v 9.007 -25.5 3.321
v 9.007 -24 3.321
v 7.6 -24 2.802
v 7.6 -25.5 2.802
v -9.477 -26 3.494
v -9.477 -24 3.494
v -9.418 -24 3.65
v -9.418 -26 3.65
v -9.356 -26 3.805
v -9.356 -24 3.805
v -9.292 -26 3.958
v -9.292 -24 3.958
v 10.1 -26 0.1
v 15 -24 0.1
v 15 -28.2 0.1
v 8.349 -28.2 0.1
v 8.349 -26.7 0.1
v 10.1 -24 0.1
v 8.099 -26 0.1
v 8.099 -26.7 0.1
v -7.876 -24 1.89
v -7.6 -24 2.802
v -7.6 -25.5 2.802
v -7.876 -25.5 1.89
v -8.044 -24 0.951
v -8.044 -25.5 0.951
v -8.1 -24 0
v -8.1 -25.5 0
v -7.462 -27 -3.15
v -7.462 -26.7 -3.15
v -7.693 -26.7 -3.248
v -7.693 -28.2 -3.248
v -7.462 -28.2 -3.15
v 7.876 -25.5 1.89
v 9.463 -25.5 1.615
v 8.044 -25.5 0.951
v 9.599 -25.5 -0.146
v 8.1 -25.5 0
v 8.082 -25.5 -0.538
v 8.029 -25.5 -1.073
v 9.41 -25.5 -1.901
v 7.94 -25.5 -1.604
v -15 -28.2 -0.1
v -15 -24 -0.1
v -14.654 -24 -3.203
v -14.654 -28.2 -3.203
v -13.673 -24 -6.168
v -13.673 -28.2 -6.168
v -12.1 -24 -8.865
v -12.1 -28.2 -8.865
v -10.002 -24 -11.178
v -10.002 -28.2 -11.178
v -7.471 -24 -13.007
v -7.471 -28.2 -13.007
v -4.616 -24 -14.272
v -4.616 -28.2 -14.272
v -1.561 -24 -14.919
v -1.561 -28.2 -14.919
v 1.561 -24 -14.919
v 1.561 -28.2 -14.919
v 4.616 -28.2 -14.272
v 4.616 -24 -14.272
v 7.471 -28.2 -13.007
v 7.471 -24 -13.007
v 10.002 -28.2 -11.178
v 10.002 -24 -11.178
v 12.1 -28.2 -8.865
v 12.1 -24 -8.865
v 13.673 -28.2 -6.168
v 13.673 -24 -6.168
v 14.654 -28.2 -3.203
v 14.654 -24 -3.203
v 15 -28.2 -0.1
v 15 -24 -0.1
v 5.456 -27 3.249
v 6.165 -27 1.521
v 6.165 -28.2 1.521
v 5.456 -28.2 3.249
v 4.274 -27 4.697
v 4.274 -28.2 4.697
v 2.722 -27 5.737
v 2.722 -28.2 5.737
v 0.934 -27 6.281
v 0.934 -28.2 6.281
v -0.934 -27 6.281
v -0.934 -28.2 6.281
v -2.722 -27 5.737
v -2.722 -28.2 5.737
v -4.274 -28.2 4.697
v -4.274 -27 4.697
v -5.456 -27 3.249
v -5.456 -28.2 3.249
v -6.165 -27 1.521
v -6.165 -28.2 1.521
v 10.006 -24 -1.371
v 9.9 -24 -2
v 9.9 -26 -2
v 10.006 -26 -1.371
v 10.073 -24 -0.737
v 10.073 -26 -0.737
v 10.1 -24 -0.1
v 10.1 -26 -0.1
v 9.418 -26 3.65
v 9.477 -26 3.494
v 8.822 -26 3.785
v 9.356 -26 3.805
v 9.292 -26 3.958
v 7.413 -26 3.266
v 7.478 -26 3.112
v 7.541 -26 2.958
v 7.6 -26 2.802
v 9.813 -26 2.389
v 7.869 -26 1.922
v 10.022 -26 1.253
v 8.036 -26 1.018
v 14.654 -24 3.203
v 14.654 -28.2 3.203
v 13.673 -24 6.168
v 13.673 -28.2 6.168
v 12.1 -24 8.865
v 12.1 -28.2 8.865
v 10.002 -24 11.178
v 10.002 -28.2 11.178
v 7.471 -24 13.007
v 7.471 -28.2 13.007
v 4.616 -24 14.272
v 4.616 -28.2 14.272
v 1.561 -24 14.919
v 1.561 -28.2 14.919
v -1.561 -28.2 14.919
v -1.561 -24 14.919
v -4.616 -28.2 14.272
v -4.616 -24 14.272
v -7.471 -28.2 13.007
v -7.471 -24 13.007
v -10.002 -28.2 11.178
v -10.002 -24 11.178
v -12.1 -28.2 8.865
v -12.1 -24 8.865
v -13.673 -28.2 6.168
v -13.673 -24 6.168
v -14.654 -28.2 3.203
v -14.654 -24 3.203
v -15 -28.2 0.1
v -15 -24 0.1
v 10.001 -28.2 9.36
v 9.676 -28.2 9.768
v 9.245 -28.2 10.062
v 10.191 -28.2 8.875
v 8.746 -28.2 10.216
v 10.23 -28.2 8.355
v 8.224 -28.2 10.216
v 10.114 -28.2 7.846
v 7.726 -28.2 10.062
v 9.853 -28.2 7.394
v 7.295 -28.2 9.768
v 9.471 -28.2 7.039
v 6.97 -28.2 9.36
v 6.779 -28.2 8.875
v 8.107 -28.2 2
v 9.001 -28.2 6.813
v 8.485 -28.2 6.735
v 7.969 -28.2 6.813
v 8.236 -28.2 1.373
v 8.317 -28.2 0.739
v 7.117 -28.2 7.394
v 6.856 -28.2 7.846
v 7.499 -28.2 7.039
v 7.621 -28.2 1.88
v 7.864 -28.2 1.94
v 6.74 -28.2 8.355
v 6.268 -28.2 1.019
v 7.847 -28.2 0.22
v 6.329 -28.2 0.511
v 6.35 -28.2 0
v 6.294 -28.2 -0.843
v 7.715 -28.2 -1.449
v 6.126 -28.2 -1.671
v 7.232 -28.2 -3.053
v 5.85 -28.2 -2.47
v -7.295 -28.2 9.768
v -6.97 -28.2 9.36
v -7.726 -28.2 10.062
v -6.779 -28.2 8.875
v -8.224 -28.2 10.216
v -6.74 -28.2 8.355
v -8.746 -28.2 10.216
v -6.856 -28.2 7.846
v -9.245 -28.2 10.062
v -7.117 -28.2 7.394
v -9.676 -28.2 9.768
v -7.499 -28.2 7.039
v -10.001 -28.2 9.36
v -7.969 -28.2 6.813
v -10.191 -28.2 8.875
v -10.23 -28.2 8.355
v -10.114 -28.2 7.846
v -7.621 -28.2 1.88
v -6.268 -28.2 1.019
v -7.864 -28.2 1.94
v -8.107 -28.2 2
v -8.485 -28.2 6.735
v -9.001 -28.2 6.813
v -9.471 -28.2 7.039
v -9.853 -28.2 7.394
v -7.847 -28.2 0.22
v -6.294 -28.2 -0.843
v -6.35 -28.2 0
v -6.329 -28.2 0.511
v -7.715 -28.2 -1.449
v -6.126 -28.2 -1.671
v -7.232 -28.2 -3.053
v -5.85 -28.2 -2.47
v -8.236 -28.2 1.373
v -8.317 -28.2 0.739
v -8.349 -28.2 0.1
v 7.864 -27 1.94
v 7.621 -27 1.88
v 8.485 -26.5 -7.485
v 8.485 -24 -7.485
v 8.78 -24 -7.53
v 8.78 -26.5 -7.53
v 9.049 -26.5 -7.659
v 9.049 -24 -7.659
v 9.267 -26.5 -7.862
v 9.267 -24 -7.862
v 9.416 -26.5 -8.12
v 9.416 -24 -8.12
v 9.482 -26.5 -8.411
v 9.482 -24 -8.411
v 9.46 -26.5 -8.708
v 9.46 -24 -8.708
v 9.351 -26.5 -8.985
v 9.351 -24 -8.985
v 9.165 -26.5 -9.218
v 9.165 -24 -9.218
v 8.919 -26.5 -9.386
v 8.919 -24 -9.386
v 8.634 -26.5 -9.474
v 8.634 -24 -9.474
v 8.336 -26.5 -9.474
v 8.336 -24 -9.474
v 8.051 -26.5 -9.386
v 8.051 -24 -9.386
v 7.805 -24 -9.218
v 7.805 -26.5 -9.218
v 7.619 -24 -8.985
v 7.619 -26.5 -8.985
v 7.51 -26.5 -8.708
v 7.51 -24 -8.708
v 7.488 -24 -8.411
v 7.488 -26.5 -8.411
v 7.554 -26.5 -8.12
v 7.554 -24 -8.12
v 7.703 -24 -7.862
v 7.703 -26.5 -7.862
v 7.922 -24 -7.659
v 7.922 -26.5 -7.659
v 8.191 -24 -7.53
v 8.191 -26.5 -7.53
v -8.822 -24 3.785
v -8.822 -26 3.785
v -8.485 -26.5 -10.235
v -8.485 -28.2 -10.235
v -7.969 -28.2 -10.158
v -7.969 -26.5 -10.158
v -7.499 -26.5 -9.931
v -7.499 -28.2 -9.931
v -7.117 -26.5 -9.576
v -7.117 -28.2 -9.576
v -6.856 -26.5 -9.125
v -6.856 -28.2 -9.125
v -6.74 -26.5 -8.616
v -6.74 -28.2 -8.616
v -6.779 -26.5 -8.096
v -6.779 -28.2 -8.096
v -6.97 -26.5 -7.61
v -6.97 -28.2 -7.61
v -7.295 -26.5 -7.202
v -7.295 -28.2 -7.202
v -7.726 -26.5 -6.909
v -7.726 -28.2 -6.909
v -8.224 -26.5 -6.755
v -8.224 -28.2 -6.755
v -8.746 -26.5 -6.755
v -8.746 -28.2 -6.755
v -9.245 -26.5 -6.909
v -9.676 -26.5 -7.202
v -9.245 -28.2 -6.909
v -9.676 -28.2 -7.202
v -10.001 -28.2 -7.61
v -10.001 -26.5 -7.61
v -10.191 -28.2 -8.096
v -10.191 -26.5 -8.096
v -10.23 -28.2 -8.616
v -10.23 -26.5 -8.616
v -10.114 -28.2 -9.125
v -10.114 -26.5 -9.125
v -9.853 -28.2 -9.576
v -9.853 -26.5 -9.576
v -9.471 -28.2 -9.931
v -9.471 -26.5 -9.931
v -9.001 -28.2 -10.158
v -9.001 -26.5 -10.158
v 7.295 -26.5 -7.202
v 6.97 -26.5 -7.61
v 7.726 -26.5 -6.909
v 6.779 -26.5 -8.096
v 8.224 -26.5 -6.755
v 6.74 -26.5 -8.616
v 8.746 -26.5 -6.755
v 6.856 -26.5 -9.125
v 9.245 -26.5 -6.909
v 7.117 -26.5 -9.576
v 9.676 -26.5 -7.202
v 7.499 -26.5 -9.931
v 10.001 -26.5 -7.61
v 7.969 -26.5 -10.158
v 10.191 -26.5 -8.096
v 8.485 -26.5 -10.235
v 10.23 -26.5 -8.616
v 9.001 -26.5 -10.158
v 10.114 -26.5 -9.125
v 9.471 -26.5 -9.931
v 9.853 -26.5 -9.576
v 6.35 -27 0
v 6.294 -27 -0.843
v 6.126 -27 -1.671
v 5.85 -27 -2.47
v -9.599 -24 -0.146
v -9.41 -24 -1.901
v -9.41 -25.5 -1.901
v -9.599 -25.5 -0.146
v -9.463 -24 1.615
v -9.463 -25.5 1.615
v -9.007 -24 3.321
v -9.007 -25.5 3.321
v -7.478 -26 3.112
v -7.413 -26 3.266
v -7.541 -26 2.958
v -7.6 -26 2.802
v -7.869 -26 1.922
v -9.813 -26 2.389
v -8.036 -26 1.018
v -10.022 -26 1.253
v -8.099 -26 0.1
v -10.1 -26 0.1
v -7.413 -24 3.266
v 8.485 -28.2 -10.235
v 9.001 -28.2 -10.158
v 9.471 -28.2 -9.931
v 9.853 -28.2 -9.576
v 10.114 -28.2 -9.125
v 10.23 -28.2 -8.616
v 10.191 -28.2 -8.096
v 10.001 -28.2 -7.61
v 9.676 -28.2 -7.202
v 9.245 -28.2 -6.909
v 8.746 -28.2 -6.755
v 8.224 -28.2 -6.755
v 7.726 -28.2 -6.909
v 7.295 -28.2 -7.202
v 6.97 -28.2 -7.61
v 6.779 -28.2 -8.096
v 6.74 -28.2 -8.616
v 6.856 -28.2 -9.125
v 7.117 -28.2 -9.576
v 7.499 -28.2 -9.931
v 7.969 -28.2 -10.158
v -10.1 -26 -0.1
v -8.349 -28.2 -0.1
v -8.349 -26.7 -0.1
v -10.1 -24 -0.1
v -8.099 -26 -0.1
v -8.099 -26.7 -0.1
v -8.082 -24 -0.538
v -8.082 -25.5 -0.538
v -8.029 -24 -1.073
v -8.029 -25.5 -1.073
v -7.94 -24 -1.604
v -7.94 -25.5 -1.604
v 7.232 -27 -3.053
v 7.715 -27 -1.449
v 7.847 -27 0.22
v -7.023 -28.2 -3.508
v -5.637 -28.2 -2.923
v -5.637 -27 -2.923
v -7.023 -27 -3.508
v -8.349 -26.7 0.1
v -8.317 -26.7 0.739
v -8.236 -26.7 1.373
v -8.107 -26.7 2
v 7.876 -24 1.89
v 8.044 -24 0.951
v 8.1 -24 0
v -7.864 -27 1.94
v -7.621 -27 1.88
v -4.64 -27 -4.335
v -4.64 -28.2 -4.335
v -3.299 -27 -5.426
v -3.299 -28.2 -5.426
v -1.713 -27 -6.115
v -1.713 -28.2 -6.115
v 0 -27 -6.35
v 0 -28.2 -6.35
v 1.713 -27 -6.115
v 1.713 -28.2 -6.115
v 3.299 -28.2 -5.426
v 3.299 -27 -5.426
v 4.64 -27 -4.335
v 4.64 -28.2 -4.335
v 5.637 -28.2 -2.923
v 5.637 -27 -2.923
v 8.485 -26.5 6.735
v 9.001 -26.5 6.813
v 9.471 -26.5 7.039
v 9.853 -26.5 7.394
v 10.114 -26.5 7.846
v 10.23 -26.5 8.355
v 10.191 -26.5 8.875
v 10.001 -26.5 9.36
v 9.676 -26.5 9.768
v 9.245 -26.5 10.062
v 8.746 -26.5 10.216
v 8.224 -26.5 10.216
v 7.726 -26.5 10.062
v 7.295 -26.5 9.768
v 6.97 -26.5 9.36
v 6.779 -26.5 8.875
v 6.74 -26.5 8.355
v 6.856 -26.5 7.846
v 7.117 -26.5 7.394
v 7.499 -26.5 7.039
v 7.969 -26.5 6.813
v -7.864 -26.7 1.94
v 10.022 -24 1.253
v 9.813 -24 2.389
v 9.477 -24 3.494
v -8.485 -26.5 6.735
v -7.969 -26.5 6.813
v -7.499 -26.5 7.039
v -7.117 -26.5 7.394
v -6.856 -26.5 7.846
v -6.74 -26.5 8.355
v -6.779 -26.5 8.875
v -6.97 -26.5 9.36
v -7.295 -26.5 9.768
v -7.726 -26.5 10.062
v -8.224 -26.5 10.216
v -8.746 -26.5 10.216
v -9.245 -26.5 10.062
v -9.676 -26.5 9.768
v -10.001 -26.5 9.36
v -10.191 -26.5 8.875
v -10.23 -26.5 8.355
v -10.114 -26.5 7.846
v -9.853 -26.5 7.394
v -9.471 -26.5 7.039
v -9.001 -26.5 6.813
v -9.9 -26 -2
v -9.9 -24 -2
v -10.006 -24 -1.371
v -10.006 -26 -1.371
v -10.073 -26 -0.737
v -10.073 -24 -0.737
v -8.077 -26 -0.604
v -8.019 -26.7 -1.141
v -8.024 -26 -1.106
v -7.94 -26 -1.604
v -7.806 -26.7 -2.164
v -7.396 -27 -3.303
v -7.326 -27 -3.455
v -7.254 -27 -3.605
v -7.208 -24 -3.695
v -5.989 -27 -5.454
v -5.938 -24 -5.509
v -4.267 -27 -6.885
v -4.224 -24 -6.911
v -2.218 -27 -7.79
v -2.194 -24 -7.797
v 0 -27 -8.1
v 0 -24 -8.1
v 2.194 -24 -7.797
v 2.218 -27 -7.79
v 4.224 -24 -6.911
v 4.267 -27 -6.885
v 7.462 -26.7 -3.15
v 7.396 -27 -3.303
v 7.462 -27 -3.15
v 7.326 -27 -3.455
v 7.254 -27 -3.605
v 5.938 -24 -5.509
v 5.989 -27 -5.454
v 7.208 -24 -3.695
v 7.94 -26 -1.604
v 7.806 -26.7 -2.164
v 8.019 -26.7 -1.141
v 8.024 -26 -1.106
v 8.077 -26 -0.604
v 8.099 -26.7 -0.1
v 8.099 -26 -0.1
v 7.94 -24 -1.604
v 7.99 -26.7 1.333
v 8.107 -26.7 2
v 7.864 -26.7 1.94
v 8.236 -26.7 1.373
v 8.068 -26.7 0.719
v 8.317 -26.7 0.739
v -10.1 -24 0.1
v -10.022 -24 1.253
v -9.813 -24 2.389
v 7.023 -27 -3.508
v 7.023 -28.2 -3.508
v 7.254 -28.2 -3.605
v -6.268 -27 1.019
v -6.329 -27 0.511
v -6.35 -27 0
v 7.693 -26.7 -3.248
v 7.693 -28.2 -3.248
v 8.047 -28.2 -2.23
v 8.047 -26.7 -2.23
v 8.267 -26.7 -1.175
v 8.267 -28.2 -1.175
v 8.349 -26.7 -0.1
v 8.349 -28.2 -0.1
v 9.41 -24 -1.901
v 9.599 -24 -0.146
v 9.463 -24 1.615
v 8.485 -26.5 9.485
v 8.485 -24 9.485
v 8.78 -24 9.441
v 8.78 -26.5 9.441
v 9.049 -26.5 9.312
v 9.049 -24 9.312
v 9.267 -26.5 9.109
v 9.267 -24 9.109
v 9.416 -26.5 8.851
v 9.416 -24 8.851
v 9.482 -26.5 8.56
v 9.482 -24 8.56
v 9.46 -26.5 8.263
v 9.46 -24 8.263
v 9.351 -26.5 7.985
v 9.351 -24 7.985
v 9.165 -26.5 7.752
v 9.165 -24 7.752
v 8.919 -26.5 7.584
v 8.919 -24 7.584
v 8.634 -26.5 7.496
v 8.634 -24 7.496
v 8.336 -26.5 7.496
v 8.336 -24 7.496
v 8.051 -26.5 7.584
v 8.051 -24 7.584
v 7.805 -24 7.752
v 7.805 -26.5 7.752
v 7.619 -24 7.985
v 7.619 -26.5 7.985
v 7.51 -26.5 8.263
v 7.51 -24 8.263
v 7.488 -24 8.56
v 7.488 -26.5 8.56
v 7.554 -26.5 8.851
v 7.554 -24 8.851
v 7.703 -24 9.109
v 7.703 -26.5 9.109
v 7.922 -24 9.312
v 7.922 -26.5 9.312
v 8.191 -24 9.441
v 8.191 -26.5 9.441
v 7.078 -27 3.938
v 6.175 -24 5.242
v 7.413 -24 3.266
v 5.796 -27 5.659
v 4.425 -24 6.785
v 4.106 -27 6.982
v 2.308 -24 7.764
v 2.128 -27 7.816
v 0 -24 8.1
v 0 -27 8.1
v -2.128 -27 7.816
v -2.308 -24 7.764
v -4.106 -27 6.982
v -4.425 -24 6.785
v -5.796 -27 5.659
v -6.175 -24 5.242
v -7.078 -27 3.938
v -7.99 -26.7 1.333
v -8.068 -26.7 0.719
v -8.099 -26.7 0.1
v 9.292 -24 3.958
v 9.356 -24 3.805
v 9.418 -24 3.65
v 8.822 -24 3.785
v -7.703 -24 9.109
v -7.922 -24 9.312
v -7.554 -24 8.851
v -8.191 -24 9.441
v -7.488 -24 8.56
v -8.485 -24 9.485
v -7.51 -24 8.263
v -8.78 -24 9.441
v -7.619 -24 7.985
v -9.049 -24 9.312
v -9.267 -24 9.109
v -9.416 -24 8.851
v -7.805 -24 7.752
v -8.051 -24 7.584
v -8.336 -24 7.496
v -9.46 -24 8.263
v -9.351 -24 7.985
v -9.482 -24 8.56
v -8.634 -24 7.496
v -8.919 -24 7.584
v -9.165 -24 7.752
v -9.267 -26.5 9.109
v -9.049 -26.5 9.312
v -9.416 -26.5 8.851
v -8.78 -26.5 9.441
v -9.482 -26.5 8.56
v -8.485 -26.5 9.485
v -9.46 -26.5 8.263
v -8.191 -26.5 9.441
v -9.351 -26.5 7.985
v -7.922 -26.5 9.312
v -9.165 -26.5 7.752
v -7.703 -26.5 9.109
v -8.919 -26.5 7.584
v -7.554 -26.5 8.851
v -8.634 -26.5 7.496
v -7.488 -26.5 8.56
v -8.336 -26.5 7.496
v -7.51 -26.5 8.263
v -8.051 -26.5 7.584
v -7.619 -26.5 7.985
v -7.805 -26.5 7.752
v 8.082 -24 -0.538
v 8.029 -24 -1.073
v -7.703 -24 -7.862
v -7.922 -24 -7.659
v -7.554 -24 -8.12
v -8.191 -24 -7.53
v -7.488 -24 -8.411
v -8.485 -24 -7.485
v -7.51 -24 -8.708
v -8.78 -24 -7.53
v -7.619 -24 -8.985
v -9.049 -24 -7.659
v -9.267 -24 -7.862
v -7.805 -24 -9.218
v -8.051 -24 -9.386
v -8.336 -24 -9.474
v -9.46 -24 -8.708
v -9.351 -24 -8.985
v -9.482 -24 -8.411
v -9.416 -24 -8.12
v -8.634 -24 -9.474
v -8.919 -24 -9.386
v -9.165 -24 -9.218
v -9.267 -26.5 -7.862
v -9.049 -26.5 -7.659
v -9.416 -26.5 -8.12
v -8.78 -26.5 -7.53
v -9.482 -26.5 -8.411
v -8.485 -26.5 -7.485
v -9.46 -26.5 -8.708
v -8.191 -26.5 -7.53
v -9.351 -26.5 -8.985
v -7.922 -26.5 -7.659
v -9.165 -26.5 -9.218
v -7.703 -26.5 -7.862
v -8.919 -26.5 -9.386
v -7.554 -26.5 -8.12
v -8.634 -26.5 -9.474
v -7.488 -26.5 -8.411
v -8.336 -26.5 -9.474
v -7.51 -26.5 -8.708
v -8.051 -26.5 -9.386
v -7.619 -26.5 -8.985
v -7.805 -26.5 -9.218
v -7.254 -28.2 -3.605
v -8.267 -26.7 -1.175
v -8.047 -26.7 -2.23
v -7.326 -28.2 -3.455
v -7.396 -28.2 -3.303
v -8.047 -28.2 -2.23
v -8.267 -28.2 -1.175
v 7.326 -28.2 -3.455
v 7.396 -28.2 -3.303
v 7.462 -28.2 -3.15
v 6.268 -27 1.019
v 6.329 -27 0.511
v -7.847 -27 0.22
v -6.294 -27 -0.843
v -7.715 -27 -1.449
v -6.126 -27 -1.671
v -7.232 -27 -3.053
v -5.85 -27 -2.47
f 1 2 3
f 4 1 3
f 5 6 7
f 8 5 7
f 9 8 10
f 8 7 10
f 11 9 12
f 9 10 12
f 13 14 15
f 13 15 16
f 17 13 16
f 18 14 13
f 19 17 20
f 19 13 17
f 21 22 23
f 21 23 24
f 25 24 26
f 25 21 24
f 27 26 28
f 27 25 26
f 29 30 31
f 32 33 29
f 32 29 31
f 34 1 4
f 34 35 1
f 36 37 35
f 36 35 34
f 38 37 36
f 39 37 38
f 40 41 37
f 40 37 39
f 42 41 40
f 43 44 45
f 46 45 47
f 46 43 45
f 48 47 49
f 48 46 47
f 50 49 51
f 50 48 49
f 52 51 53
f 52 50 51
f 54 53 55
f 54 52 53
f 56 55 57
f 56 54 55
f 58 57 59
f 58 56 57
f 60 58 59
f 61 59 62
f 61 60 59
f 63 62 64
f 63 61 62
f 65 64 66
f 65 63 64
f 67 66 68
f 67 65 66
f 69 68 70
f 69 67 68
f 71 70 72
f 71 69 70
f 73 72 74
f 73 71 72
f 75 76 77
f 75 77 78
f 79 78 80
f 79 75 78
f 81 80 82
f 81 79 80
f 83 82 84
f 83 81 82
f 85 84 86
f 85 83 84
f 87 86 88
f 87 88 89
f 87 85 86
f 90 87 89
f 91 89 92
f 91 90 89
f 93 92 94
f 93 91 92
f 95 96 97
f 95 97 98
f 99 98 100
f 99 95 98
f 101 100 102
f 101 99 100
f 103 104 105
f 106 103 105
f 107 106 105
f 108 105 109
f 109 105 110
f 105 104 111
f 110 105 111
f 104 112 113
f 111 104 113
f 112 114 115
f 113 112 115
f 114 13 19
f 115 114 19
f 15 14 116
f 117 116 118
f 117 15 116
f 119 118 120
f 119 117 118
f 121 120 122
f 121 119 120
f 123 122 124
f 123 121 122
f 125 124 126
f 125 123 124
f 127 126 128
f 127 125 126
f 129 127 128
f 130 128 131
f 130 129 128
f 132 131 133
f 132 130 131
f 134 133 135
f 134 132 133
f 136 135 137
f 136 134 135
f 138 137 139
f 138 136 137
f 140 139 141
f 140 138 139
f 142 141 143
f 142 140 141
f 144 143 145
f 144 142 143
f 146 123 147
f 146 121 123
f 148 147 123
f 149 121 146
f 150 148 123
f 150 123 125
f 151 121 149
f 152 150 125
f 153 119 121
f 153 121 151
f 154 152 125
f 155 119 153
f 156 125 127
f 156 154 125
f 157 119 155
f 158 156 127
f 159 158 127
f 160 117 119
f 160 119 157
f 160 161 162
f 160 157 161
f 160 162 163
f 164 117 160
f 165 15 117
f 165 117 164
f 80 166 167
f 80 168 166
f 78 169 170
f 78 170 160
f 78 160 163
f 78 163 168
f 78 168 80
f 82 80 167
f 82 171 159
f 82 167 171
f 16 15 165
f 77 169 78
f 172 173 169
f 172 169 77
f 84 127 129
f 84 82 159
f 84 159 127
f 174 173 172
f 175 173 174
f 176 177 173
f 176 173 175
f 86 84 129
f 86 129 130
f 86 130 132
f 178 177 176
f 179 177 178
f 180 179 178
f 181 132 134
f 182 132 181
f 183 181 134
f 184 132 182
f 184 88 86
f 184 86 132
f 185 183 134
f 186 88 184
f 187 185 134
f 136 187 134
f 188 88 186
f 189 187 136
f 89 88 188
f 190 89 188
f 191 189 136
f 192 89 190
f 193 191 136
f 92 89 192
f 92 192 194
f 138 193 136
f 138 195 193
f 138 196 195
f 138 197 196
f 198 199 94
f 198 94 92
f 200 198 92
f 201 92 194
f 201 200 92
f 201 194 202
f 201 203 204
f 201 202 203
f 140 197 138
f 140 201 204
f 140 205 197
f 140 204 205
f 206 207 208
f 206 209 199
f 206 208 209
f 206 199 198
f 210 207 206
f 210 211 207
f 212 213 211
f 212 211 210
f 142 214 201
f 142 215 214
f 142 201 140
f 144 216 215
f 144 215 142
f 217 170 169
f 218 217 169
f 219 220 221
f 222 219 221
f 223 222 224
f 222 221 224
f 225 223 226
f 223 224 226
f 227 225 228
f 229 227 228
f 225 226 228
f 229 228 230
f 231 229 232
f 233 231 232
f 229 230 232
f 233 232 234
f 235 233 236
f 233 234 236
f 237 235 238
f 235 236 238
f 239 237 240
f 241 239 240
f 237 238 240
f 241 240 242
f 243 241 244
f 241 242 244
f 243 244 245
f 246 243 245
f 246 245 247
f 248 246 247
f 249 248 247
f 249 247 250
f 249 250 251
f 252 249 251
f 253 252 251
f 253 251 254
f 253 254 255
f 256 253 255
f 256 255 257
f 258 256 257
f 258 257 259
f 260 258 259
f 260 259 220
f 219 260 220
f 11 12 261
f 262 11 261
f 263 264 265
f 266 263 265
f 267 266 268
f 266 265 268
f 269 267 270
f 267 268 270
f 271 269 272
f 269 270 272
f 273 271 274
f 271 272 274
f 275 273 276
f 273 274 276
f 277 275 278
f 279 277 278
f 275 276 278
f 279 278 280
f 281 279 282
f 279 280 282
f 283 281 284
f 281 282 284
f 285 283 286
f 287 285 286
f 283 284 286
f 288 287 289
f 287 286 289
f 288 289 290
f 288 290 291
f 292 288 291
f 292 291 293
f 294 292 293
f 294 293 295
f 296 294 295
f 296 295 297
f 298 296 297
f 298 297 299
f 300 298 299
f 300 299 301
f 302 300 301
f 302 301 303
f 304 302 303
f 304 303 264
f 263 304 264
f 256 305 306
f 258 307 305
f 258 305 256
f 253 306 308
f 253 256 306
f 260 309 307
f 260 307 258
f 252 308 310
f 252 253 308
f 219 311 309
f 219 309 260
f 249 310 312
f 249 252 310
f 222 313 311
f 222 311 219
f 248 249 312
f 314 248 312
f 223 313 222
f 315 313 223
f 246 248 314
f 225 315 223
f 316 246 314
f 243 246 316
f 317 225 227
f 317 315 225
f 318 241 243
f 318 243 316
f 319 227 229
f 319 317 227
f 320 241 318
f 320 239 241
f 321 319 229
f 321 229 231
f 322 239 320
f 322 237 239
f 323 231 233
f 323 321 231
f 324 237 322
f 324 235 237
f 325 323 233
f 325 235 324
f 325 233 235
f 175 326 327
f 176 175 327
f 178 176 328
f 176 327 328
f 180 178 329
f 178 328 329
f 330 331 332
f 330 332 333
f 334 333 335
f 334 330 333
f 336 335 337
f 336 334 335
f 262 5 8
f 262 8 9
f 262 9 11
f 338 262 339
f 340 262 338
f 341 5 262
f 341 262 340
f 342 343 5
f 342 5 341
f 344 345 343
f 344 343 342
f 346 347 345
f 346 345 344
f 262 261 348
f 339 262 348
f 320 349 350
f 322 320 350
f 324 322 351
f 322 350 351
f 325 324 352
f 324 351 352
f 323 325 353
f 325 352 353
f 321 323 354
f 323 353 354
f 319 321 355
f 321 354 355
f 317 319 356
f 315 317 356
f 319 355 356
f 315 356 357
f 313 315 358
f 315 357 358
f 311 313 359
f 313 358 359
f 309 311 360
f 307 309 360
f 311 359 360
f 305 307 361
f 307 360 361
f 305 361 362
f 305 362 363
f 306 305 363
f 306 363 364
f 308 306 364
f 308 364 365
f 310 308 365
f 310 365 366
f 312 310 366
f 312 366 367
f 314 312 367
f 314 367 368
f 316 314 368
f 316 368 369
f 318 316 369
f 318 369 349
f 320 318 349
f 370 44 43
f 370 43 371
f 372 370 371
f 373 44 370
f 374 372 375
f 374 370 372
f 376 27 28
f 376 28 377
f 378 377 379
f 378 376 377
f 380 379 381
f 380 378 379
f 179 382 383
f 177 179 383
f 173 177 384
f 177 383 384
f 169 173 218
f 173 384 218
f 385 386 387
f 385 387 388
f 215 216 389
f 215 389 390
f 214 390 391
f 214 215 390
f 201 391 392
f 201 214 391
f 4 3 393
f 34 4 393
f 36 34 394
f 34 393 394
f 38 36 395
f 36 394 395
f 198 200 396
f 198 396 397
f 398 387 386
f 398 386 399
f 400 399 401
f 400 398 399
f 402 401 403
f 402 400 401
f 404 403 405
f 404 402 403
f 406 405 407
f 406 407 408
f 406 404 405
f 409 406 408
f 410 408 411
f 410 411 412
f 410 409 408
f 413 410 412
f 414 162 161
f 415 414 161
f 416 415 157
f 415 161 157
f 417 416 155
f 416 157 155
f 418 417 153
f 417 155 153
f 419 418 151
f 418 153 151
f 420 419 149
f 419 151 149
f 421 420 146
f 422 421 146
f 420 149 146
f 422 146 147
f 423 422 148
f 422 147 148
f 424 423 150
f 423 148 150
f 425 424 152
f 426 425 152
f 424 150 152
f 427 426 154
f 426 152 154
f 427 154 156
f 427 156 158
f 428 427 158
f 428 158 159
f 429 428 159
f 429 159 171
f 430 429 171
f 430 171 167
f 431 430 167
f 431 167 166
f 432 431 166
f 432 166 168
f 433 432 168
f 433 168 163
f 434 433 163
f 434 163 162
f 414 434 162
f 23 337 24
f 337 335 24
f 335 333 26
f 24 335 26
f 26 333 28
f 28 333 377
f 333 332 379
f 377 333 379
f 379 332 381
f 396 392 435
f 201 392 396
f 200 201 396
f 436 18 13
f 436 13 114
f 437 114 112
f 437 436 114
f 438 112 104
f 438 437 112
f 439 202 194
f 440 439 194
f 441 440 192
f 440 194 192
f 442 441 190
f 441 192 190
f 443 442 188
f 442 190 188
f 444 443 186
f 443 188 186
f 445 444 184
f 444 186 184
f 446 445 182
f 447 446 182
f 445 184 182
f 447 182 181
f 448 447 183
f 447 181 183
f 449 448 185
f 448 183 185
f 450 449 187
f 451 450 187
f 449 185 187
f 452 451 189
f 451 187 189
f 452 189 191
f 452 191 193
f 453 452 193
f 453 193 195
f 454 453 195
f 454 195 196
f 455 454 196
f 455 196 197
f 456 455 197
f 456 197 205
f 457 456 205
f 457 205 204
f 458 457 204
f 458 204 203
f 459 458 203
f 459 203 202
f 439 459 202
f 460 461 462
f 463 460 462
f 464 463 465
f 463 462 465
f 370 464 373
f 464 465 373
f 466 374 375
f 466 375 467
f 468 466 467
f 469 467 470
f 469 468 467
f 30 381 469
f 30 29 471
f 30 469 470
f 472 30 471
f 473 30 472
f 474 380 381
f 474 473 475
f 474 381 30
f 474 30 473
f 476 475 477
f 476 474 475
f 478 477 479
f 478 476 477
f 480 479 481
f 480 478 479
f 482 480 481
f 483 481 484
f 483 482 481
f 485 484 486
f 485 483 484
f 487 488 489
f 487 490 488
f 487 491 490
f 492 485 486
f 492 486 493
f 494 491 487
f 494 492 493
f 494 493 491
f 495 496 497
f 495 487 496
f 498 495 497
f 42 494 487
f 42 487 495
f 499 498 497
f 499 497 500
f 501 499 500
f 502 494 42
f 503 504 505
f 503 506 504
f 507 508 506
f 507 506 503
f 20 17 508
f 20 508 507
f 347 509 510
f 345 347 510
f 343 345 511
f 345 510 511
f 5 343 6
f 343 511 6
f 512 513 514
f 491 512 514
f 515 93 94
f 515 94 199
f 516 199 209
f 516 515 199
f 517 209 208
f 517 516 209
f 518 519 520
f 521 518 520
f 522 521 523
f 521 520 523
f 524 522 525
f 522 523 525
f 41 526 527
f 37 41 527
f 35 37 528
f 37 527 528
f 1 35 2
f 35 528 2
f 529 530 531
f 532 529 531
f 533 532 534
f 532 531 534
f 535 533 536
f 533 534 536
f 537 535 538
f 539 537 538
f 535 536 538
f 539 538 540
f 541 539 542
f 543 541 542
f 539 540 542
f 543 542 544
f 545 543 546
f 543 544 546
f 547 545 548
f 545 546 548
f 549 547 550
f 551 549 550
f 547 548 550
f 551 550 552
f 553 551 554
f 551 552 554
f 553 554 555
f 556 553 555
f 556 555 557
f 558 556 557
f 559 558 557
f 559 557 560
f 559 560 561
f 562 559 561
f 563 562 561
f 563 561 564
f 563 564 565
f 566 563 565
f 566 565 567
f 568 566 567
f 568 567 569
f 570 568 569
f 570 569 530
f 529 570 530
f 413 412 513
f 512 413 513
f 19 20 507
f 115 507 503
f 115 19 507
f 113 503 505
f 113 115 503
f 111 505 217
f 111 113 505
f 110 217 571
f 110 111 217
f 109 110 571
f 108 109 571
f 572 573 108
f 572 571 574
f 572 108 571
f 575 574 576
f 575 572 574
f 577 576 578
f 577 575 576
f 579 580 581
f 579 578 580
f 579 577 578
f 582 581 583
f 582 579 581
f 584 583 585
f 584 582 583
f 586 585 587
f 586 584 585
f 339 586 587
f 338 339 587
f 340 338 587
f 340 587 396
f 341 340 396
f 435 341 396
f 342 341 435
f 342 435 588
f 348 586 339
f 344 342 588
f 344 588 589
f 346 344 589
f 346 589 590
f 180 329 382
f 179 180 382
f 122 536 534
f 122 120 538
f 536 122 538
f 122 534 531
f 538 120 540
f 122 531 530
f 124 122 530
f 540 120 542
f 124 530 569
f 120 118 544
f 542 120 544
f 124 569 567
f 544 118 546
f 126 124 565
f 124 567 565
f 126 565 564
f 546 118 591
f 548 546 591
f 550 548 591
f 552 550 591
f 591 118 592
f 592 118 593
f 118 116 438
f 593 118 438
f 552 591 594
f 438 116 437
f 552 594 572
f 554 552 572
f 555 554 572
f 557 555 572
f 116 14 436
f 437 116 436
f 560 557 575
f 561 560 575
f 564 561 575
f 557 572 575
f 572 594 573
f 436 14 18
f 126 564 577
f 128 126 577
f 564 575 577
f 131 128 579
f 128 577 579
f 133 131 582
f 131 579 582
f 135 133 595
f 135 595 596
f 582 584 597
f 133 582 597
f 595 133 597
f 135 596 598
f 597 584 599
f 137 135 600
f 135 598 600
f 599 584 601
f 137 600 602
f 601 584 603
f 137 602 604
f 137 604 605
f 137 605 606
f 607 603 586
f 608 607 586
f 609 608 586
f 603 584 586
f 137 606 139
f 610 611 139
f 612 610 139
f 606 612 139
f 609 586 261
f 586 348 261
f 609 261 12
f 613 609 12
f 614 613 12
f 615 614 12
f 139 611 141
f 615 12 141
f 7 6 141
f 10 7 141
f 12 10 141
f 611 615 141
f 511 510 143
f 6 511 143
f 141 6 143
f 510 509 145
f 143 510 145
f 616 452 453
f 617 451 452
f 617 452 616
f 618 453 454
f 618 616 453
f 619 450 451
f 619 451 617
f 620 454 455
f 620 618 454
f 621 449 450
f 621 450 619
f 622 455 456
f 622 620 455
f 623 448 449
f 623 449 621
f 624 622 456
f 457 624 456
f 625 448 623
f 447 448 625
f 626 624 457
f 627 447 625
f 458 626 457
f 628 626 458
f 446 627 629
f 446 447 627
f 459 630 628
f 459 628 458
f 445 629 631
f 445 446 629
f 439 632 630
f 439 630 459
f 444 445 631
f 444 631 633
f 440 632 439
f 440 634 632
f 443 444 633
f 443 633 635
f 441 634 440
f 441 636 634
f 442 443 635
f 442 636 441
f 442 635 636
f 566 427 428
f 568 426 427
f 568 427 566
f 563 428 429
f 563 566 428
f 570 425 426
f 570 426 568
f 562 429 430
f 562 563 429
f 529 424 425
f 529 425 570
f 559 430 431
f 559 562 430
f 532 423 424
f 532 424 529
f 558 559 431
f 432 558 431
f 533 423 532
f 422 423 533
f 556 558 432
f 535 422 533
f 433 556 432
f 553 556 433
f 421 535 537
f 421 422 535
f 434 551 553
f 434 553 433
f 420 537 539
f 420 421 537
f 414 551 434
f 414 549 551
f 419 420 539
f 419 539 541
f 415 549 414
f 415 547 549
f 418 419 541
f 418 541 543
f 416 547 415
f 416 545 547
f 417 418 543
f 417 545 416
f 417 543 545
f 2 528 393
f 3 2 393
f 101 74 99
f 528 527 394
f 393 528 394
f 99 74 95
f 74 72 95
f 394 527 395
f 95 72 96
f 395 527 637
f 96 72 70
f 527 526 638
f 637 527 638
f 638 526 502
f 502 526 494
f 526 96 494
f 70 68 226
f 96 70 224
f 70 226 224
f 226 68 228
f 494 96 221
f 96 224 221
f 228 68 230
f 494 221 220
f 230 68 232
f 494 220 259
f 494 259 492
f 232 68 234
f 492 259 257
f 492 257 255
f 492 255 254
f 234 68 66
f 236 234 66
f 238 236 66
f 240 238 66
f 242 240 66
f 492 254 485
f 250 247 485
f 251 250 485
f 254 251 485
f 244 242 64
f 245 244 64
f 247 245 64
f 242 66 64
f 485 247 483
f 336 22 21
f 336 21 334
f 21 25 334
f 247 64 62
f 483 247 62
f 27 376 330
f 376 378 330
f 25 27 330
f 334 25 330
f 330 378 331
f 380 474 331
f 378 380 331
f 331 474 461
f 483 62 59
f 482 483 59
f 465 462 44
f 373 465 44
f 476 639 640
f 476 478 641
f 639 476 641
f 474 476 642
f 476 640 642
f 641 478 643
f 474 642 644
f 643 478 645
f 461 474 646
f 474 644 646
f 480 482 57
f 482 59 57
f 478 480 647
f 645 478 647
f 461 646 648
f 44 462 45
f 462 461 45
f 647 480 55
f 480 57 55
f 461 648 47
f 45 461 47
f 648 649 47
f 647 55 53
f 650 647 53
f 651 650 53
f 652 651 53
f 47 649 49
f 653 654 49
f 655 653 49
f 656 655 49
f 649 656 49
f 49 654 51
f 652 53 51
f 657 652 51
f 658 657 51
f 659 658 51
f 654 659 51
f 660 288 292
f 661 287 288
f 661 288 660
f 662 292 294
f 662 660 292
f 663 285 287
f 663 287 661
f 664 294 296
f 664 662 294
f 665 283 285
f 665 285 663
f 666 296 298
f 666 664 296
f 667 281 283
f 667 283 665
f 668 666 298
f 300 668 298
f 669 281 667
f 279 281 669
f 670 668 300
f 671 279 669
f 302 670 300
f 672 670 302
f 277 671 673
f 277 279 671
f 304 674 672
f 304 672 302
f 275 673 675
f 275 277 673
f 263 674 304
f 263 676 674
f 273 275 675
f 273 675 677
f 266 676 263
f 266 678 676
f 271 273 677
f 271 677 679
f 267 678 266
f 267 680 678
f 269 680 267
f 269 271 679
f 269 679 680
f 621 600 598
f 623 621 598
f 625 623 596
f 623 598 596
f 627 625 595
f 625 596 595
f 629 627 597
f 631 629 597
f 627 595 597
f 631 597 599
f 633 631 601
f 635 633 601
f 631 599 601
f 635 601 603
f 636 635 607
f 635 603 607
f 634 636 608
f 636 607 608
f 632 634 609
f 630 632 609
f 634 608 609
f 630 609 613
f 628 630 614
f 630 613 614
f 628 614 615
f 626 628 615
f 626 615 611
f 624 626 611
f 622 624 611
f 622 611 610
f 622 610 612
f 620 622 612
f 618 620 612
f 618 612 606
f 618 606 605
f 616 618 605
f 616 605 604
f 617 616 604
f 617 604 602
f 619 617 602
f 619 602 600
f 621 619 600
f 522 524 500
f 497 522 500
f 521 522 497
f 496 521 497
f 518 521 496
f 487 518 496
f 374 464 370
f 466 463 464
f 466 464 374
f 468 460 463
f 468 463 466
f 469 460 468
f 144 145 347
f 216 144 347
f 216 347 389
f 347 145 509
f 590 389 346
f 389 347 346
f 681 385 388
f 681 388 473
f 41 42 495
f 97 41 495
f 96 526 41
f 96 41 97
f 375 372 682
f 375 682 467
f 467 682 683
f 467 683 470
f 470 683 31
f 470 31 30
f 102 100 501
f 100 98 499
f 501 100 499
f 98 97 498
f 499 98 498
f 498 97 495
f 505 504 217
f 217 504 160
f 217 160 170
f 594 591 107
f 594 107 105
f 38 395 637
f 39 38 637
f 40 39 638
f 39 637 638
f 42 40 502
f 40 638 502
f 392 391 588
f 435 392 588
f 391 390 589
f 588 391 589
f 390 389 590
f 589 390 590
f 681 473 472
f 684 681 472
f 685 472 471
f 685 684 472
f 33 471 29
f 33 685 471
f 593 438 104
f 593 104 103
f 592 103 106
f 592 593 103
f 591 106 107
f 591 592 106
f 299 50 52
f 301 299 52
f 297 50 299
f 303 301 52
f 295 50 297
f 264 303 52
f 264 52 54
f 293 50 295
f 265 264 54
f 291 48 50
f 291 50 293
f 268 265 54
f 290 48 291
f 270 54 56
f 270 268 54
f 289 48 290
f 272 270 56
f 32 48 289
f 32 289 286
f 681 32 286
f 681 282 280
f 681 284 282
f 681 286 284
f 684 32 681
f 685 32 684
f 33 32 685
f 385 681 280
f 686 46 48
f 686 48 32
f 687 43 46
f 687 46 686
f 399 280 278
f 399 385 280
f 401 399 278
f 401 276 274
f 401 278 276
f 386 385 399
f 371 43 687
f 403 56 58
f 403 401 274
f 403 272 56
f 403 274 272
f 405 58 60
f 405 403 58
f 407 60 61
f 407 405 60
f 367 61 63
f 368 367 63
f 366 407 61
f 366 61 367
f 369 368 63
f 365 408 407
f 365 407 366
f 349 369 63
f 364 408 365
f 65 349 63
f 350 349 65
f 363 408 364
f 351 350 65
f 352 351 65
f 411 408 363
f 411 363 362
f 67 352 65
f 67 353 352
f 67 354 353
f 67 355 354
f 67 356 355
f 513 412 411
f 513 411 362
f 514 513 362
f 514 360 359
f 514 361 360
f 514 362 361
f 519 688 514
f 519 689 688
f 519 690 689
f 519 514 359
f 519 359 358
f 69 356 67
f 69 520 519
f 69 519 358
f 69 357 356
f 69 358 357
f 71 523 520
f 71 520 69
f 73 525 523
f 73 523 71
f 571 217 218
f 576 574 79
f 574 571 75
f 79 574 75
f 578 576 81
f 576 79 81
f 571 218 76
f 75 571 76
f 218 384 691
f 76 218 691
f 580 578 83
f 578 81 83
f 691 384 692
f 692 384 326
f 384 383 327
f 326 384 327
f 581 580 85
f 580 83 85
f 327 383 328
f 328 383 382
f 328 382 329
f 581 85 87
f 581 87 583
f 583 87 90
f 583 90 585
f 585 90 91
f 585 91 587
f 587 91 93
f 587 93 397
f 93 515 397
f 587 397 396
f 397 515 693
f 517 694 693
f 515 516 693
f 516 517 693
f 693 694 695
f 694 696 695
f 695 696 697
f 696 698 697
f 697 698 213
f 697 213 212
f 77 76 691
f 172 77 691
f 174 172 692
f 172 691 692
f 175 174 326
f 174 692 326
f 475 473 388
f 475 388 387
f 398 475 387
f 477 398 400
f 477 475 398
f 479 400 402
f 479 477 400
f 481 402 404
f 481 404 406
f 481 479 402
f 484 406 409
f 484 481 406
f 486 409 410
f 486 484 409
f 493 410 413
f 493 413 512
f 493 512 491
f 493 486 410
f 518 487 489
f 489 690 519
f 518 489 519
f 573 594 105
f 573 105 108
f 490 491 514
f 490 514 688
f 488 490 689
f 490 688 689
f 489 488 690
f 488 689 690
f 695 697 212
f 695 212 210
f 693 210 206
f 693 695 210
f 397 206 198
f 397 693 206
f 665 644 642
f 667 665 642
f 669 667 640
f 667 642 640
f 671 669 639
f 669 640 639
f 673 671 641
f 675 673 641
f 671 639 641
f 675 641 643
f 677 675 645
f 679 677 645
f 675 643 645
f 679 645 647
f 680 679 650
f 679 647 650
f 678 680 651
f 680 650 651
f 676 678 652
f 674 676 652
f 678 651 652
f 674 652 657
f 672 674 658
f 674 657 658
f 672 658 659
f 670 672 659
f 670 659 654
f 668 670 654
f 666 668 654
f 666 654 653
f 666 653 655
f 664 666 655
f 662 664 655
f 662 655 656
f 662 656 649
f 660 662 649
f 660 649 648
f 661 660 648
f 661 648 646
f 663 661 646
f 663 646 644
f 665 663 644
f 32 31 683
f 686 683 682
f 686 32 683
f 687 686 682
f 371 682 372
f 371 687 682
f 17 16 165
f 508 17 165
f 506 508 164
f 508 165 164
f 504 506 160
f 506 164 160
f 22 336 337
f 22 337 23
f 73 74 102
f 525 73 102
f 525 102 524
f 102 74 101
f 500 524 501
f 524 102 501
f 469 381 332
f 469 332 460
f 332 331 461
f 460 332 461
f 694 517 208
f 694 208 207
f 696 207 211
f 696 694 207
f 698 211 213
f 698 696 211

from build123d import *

# Parameters (mm, degrees)
SKETCH4_R           = 1
CUT_EXTRUDE2_DEPTH  = 25.879710609
SKETCH4_3_R         = 1.75
SKETCH4_3_R_2       = 1
CUT_EXTRUDE3_DEPTH  = 9.4
CHAMFER1_SIZE       = 1
SKETCH2_W           = 41.708786628
SKETCH2_H           = 54.576605706
CUT_EXTRUDE1_DEPTH  = 0.05
SKETCH1_5_W         = 6.9
SKETCH1_5_H         = 3
SKETCH1_5_H_2       = 1.2
SKETCH4_4_R         = 1
CUT_EXTRUDE4_DEPTH  = 27.813429471
SKETCH5_R           = 1.75
CUT_EXTRUDE5_DEPTH  = 2.9
CUT_EXTRUDE8_DEPTH  = 2
BOSS_EXTRUDE1_DEPTH = 1.5
CUT_EXTRUDE9_START  = -1.5
CUT_EXTRUDE9_DEPTH  = 1.8
BOSS_EXTRUDE2_DEPTH = 1.2
SKETCH10_W          = 7.7
SKETCH10_H          = 10
SKETCH10_W_2        = 1.8
SKETCH10_H_2        = 3.6
CUT_EXTRUDE10_DEPTH = 0.1
CUT_EXTRUDE11_DEPTH = 1.2


with BuildPart() as part:
    # Sketch1 → Revolve1 (revolve)
    with BuildSketch(Plane.XY, mode=Mode.PRIVATE) as revolve1_sk:
        Polygon((-3, 0), (-8, 0), (-8, -3.7), (-6, -3.7), (-6, -9.7), (-8, -9.7), (-8, -13), (-15, -13), (-15, -23.9), (-6.1, -23.9), (-6.1, -21), (-8.1, -21), (-8.1, -14.3), (-3, -14.3), align=None)
    revolve(revolve1_sk.sketch.rotate(Axis((0, 21.737527327, 0), (0, -1, 0)), 270), axis=Axis((0, 21.737527327, 0), (0, -1, 0)))

    # Sketch4 → Cut-Extrude2 (cut, through all)
    with BuildSketch(Plane(origin=(0, -13, 0), x_dir=(1, 0, 0), z_dir=(0, 1, 0))):
        with Locations(Location((-8.485281374, 8.485281374, 0), (0, 0, 270))):
            Circle(SKETCH4_R)
        with Locations(Location((8.485281374, 8.485281374, 0), (0, 0, 270))):
            Circle(SKETCH4_R)
        with Locations(Location((8.485281374, -8.485281374, 0), (0, 0, 270))):
            Circle(SKETCH4_R)
        with Locations(Location((-8.485281374, -8.485281374, 0), (0, 0, 270))):
            Circle(SKETCH4_R)
    extrude(amount=-CUT_EXTRUDE2_DEPTH, mode=Mode.SUBTRACT)

    # Sketch4<3> → Cut-Extrude3 (cut)
    # profile 1 of 5: a face of its own
    with BuildSketch(Plane(origin=(0, -13, 0), x_dir=(1, 0, 0), z_dir=(0, 1, 0))):
        with Locations(Location((8.485281374, 8.485281374, 0), (0, 0, 270))):
            Circle(SKETCH4_3_R)
        with Locations(Location((8.485281374, 8.485281374, 0), (0, 0, 270))):
            Circle(SKETCH4_3_R_2, mode=Mode.SUBTRACT)
    # profile 2 of 5: a face of its own
    with BuildSketch(Plane(origin=(0, -13, 0), x_dir=(1, 0, 0), z_dir=(0, 1, 0))):
        with Locations(Location((8.485281374, -8.485281374, 0), (0, 0, 270))):
            Circle(SKETCH4_3_R)
        with Locations(Location((8.485281374, -8.485281374, 0), (0, 0, 270))):
            Circle(SKETCH4_3_R_2, mode=Mode.SUBTRACT)
    # profile 3 of 5: a face of its own
    with BuildSketch(Plane(origin=(0, -13, 0), x_dir=(1, 0, 0), z_dir=(0, 1, 0))):
        with Locations(Location((-8.485281374, -8.485281374, 0), (0, 0, 270))):
            Circle(SKETCH4_3_R)
        with Locations(Location((-8.485281374, -8.485281374, 0), (0, 0, 270))):
            Circle(SKETCH4_3_R_2, mode=Mode.SUBTRACT)
    # profile 4 of 5: a face of its own
    with BuildSketch(Plane(origin=(0, -13, 0), x_dir=(1, 0, 0), z_dir=(0, 1, 0))):
        with Locations(Location((-8.485281374, 8.485281374, 0), (0, 0, 270))):
            Circle(SKETCH4_3_R_2)
    # profile 5 of 5: a face of its own
    with BuildSketch(Plane(origin=(0, -13, 0), x_dir=(1, 0, 0), z_dir=(0, 1, 0))):
        with Locations(Location((-8.485281374, 8.485281374, 0), (0, 0, 270))):
            Circle(SKETCH4_3_R)
    extrude(amount=-CUT_EXTRUDE3_DEPTH, mode=Mode.SUBTRACT)

    # Chamfer1
    chamfer1_edges = [part.edges().sort_by_distance(p)[0] for p in [
        (0, 0, -3),
    ]]
    chamfer(chamfer1_edges, length=CHAMFER1_SIZE)

    # Sketch2 → Cut-Extrude1 (cut, symmetric)
    with BuildSketch(Plane.XY):
        Rectangle(SKETCH2_W, SKETCH2_H)
    extrude(amount=CUT_EXTRUDE1_DEPTH, both=True, mode=Mode.SUBTRACT)


with BuildPart() as cut_extrude1_piece_1:
    # of the separate pieces the step leaves, piece 1, a body of its own (cut_extrude1_pieces)
    add(part.part.solids().sort_by_distance((-2.999583304, -1, 0.05))[0])


with BuildPart() as cut_extrude1_piece_2:
    # of the separate pieces the step leaves, piece 2, a body of its own (cut_extrude1_pieces)
    add(part.part.solids().sort_by_distance((-2.999583304, -1, -0.05))[0])


with BuildPart() as body_3:
    # Sketch1<5> → Revolve2 (revolve)
    with BuildSketch(Plane.XY, mode=Mode.PRIVATE) as revolve2_sk:
        with Locations((-11.55, -25.5)):
            Rectangle(SKETCH1_5_W, SKETCH1_5_H)
        Polygon((-6.35, -27), (-8.1, -27), (-15, -27), (-15, -28.2), (-8.1, -28.2), (-6.35, -28.2), align=None)
        with Locations((-11.55, -28.8)):
            Rectangle(SKETCH1_5_W, SKETCH1_5_H_2)
    revolve(revolve2_sk.sketch.rotate(Axis((0, 21.737527327, 0), (0, -1, 0)), 270), axis=Axis((0, 21.737527327, 0), (0, -1, 0)))

    # Sketch4<4> → Cut-Extrude4 (cut, through all)
    with BuildSketch(Plane(origin=(0, -13, 0), x_dir=(1, 0, 0), z_dir=(0, 1, 0))):
        with Locations(Location((8.485281374, 8.485281374, 0), (0, 0, 270))):
            Circle(SKETCH4_4_R)
        with Locations(Location((8.485281374, -8.485281374, 0), (0, 0, 270))):
            Circle(SKETCH4_4_R)
        with Locations(Location((-8.485281374, 8.485281374, 0), (0, 0, 270))):
            Circle(SKETCH4_4_R)
        with Locations(Location((-8.485281374, -8.485281374, 0), (0, 0, 270))):
            Circle(SKETCH4_4_R)
    extrude(amount=-CUT_EXTRUDE4_DEPTH, mode=Mode.SUBTRACT)

    # Sketch5 → Cut-Extrude5 (cut)
    with BuildSketch(Plane.XZ.offset(29.4)):
        with Locations(Location((8.485281374, 8.485281374, 0), (0, 0, 270))):
            Circle(SKETCH5_R)
        with Locations(Location((-8.485281374, 8.485281374, 0), (0, 0, 270))):
            Circle(SKETCH5_R)
        with Locations(Location((-8.485281374, -8.485281374, 0), (0, 0, 270))):
            Circle(SKETCH5_R)
        with Locations(Location((8.485281374, -8.485281374, 0), (0, 0, 270))):
            Circle(SKETCH5_R)
    extrude(amount=-CUT_EXTRUDE5_DEPTH, mode=Mode.SUBTRACT)

    # Sketch8 → Cut-Extrude8 (cut)
    with BuildSketch(Plane(origin=(0, -24, 0), x_dir=(1, 0, 0), z_dir=(0, 1, 0))):
        with BuildLine():
            ThreePointArc((-7.41255698, -3.265577899), (-7.509859699, -3.035128877), (-7.6, -2.801785145))
            Line((-7.6, -2.801785145), (-9.007407407, -3.320634246))
            ThreePointArc((-9.007407407, -3.320634246), (-8.917846338, -3.55415485), (-8.822232332, -3.785263092))
            Line((-8.822232332, -3.785263092), (-7.41255698, -3.265577899))
        make_face()
        with BuildLine():
            ThreePointArc((-8.822232332, -3.785263092), (-8.917846338, -3.55415485), (-9.007407407, -3.320634246))
            Line((-9.007407407, -3.320634246), (-9.47654321, -3.493583947))
            ThreePointArc((-9.47654321, -3.493583947), (-9.387136546, -3.727152729), (-9.291974114, -3.95843619))
            Line((-9.291974114, -3.95843619), (-8.822232332, -3.785263092))
        make_face()
        with BuildLine():
            Line((-9.47654321, -3.493583947), (-9.007407407, -3.320634246))
            ThreePointArc((-9.007407407, -3.320634246), (-9.571606571, -0.737799192), (-9.40990099, 1.900990099))
            Line((-9.40990099, 1.900990099), (-9.9, 2))
            ThreePointArc((-9.9, 2), (-10.070127747, -0.776226233), (-9.47654321, -3.493583947))
        make_face()
        with BuildLine():
            Line((-9.007407407, -3.320634246), (-7.6, -2.801785145))
            ThreePointArc((-7.6, -2.801785145), (-7.974020316, -1.423024947), (-8.1, 0))
            ThreePointArc((-8.1, 0), (-8.059801241, 0.805980124), (-7.93960396, 1.603960396))
            Line((-7.93960396, 1.603960396), (-9.40990099, 1.900990099))
            ThreePointArc((-9.40990099, 1.900990099), (-9.571606571, -0.737799192), (-9.007407407, -3.320634246))
        make_face()
    cut_extrude8 = extrude(amount=-CUT_EXTRUDE8_DEPTH, mode=Mode.SUBTRACT)

    # Sketch8<3> → Boss-Extrude1 (add)
    with BuildSketch(Plane(origin=(0, -24, 0), x_dir=(1, 0, 0), z_dir=(0, 1, 0))):
        with BuildLine():
            Line((-9.007407407, -3.320634246), (-7.6, -2.801785145))
            ThreePointArc((-7.6, -2.801785145), (-7.974020316, -1.423024947), (-8.1, 0))
            ThreePointArc((-8.1, 0), (-8.059801241, 0.805980124), (-7.93960396, 1.603960396))
            Line((-7.93960396, 1.603960396), (-9.40990099, 1.900990099))
            ThreePointArc((-9.40990099, 1.900990099), (-9.571606571, -0.737799192), (-9.007407407, -3.320634246))
        make_face()
    boss_extrude1 = extrude(amount=-BOSS_EXTRUDE1_DEPTH)

    # Sketch9 → Cut-Extrude9 (cut)
    with BuildSketch(Plane(origin=(0, -27, 0), x_dir=(1, 0, 0), z_dir=(0, 1, 0)).offset(CUT_EXTRUDE9_START)):
        with BuildLine():
            ThreePointArc((-7.621495873, -1.880239521), (-7.825635414, 0.618005155), (-7.231889764, 3.053239336))
            Line((-7.231889764, 3.053239336), (-7.462204724, 3.150476258))
            ThreePointArc((-7.462204724, 3.150476258), (-8.074859471, 0.637686848), (-7.864218672, -1.94011976))
            Line((-7.864218672, -1.94011976), (-7.621495873, -1.880239521))
        make_face()
        with BuildLine():
            ThreePointArc((-7.864218672, -1.94011976), (-8.074859471, 0.637686848), (-7.462204724, 3.150476258))
            Line((-7.462204724, 3.150476258), (-7.692519685, 3.247713179))
            ThreePointArc((-7.692519685, 3.247713179), (-8.324083529, 0.657368541), (-8.10694147, -2))
            Line((-8.10694147, -2), (-7.864218672, -1.94011976))
        make_face()
        with BuildLine():
            Line((-7.462204724, 3.150476258), (-7.231889764, 3.053239336))
            ThreePointArc((-7.231889764, 3.053239336), (-7.130931349, 3.282120976), (-7.022731269, 3.507669529))
            Line((-7.022731269, 3.507669529), (-7.25350034, 3.605098171))
            ThreePointArc((-7.25350034, 3.605098171), (-7.361362928, 3.37939874), (-7.462204724, 3.150476258))
        make_face()
        with BuildLine():
            Line((-7.231889764, 3.053239336), (-5.85, 2.469817807))
            ThreePointArc((-5.85, 2.469817807), (-5.748144943, 2.698393915), (-5.637362924, 2.922779373))
            Line((-5.637362924, 2.922779373), (-7.022731269, 3.507669529))
            ThreePointArc((-7.022731269, 3.507669529), (-7.130931349, 3.282120976), (-7.231889764, 3.053239336))
        make_face()
        with BuildLine():
            ThreePointArc((-6.35, 0), (-6.223744853, 1.259960317), (-5.85, 2.469817807))
            Line((-5.85, 2.469817807), (-7.231889764, 3.053239336))
            ThreePointArc((-7.231889764, 3.053239336), (-7.825635414, 0.618005155), (-7.621495873, -1.880239521))
            Line((-7.621495873, -1.880239521), (-6.165159082, -1.520958084))
            ThreePointArc((-6.165159082, -1.520958084), (-6.303620395, -0.766074353), (-6.35, 0))
        make_face()
    cut_extrude9 = extrude(amount=CUT_EXTRUDE9_DEPTH, mode=Mode.SUBTRACT)

    # Sketch9<3> → Boss-Extrude2 (add)
    with BuildSketch(Plane(origin=(0, -27, 0), x_dir=(1, 0, 0), z_dir=(0, 1, 0))):
        with BuildLine():
            ThreePointArc((-6.35, 0), (-6.223744853, 1.259960317), (-5.85, 2.469817807))
            Line((-5.85, 2.469817807), (-7.231889764, 3.053239336))
            ThreePointArc((-7.231889764, 3.053239336), (-7.825635414, 0.618005155), (-7.621495873, -1.880239521))
            Line((-7.621495873, -1.880239521), (-6.165159082, -1.520958084))
            ThreePointArc((-6.165159082, -1.520958084), (-6.303620395, -0.766074353), (-6.35, 0))
        make_face()
    boss_extrude2 = extrude(amount=-BOSS_EXTRUDE2_DEPTH)

    # Sketch10 → Cut-Extrude10 (cut, symmetric)
    with BuildSketch(Plane.XY):
        with Locations((-13.65, -24.4)):
            Rectangle(SKETCH10_W, SKETCH10_H)
        with Locations((-8.9, -27.6)):
            Rectangle(SKETCH10_W_2, SKETCH10_H_2)
    cut_extrude10 = extrude(amount=CUT_EXTRUDE10_DEPTH, both=True, mode=Mode.SUBTRACT)

    # Mirror1: Cut-Extrude8, Boss-Extrude1, Cut-Extrude9, Boss-Extrude2, Cut-Extrude10 across plane
    add(cut_extrude8.mirror(Plane(origin=(0, 0, 0), x_dir=(0, 0, 1), z_dir=(1, 0, 0))), mode=Mode.SUBTRACT)
    add(boss_extrude1.mirror(Plane(origin=(0, 0, 0), x_dir=(0, 0, 1), z_dir=(1, 0, 0))))
    add(cut_extrude9.mirror(Plane(origin=(0, 0, 0), x_dir=(0, 0, 1), z_dir=(1, 0, 0))), mode=Mode.SUBTRACT)
    add(boss_extrude2.mirror(Plane(origin=(0, 0, 0), x_dir=(0, 0, 1), z_dir=(1, 0, 0))))
    add(cut_extrude10.mirror(Plane(origin=(0, 0, 0), x_dir=(0, 0, 1), z_dir=(1, 0, 0))), mode=Mode.SUBTRACT)

    # Sketch11 → Cut-Extrude11 (cut)
    with BuildSketch(Plane.XZ.offset(29.4)):
        with BuildLine():
            Line((8.099382693, 0.1), (14.999666663, 0.1))
            ThreePointArc((14.999666663, 0.1), (0, 15), (-14.999666663, 0.1))
            Line((-14.999666663, 0.1), (-8.099382693, 0.1))
            ThreePointArc((-8.099382693, 0.1), (0, 8.1), (8.099382693, 0.1))
        make_face()
        with BuildLine():
            Line((14.999666663, -0.1), (8.099382693, -0.1))
            ThreePointArc((8.099382693, -0.1), (0, -8.1), (-8.099382693, -0.1))
            Line((-8.099382693, -0.1), (-14.999666663, -0.1))
            ThreePointArc((-14.999666663, -0.1), (0, -15), (14.999666663, -0.1))
        make_face()
    extrude(amount=-CUT_EXTRUDE11_DEPTH, mode=Mode.SUBTRACT)


solid = body_3.part
